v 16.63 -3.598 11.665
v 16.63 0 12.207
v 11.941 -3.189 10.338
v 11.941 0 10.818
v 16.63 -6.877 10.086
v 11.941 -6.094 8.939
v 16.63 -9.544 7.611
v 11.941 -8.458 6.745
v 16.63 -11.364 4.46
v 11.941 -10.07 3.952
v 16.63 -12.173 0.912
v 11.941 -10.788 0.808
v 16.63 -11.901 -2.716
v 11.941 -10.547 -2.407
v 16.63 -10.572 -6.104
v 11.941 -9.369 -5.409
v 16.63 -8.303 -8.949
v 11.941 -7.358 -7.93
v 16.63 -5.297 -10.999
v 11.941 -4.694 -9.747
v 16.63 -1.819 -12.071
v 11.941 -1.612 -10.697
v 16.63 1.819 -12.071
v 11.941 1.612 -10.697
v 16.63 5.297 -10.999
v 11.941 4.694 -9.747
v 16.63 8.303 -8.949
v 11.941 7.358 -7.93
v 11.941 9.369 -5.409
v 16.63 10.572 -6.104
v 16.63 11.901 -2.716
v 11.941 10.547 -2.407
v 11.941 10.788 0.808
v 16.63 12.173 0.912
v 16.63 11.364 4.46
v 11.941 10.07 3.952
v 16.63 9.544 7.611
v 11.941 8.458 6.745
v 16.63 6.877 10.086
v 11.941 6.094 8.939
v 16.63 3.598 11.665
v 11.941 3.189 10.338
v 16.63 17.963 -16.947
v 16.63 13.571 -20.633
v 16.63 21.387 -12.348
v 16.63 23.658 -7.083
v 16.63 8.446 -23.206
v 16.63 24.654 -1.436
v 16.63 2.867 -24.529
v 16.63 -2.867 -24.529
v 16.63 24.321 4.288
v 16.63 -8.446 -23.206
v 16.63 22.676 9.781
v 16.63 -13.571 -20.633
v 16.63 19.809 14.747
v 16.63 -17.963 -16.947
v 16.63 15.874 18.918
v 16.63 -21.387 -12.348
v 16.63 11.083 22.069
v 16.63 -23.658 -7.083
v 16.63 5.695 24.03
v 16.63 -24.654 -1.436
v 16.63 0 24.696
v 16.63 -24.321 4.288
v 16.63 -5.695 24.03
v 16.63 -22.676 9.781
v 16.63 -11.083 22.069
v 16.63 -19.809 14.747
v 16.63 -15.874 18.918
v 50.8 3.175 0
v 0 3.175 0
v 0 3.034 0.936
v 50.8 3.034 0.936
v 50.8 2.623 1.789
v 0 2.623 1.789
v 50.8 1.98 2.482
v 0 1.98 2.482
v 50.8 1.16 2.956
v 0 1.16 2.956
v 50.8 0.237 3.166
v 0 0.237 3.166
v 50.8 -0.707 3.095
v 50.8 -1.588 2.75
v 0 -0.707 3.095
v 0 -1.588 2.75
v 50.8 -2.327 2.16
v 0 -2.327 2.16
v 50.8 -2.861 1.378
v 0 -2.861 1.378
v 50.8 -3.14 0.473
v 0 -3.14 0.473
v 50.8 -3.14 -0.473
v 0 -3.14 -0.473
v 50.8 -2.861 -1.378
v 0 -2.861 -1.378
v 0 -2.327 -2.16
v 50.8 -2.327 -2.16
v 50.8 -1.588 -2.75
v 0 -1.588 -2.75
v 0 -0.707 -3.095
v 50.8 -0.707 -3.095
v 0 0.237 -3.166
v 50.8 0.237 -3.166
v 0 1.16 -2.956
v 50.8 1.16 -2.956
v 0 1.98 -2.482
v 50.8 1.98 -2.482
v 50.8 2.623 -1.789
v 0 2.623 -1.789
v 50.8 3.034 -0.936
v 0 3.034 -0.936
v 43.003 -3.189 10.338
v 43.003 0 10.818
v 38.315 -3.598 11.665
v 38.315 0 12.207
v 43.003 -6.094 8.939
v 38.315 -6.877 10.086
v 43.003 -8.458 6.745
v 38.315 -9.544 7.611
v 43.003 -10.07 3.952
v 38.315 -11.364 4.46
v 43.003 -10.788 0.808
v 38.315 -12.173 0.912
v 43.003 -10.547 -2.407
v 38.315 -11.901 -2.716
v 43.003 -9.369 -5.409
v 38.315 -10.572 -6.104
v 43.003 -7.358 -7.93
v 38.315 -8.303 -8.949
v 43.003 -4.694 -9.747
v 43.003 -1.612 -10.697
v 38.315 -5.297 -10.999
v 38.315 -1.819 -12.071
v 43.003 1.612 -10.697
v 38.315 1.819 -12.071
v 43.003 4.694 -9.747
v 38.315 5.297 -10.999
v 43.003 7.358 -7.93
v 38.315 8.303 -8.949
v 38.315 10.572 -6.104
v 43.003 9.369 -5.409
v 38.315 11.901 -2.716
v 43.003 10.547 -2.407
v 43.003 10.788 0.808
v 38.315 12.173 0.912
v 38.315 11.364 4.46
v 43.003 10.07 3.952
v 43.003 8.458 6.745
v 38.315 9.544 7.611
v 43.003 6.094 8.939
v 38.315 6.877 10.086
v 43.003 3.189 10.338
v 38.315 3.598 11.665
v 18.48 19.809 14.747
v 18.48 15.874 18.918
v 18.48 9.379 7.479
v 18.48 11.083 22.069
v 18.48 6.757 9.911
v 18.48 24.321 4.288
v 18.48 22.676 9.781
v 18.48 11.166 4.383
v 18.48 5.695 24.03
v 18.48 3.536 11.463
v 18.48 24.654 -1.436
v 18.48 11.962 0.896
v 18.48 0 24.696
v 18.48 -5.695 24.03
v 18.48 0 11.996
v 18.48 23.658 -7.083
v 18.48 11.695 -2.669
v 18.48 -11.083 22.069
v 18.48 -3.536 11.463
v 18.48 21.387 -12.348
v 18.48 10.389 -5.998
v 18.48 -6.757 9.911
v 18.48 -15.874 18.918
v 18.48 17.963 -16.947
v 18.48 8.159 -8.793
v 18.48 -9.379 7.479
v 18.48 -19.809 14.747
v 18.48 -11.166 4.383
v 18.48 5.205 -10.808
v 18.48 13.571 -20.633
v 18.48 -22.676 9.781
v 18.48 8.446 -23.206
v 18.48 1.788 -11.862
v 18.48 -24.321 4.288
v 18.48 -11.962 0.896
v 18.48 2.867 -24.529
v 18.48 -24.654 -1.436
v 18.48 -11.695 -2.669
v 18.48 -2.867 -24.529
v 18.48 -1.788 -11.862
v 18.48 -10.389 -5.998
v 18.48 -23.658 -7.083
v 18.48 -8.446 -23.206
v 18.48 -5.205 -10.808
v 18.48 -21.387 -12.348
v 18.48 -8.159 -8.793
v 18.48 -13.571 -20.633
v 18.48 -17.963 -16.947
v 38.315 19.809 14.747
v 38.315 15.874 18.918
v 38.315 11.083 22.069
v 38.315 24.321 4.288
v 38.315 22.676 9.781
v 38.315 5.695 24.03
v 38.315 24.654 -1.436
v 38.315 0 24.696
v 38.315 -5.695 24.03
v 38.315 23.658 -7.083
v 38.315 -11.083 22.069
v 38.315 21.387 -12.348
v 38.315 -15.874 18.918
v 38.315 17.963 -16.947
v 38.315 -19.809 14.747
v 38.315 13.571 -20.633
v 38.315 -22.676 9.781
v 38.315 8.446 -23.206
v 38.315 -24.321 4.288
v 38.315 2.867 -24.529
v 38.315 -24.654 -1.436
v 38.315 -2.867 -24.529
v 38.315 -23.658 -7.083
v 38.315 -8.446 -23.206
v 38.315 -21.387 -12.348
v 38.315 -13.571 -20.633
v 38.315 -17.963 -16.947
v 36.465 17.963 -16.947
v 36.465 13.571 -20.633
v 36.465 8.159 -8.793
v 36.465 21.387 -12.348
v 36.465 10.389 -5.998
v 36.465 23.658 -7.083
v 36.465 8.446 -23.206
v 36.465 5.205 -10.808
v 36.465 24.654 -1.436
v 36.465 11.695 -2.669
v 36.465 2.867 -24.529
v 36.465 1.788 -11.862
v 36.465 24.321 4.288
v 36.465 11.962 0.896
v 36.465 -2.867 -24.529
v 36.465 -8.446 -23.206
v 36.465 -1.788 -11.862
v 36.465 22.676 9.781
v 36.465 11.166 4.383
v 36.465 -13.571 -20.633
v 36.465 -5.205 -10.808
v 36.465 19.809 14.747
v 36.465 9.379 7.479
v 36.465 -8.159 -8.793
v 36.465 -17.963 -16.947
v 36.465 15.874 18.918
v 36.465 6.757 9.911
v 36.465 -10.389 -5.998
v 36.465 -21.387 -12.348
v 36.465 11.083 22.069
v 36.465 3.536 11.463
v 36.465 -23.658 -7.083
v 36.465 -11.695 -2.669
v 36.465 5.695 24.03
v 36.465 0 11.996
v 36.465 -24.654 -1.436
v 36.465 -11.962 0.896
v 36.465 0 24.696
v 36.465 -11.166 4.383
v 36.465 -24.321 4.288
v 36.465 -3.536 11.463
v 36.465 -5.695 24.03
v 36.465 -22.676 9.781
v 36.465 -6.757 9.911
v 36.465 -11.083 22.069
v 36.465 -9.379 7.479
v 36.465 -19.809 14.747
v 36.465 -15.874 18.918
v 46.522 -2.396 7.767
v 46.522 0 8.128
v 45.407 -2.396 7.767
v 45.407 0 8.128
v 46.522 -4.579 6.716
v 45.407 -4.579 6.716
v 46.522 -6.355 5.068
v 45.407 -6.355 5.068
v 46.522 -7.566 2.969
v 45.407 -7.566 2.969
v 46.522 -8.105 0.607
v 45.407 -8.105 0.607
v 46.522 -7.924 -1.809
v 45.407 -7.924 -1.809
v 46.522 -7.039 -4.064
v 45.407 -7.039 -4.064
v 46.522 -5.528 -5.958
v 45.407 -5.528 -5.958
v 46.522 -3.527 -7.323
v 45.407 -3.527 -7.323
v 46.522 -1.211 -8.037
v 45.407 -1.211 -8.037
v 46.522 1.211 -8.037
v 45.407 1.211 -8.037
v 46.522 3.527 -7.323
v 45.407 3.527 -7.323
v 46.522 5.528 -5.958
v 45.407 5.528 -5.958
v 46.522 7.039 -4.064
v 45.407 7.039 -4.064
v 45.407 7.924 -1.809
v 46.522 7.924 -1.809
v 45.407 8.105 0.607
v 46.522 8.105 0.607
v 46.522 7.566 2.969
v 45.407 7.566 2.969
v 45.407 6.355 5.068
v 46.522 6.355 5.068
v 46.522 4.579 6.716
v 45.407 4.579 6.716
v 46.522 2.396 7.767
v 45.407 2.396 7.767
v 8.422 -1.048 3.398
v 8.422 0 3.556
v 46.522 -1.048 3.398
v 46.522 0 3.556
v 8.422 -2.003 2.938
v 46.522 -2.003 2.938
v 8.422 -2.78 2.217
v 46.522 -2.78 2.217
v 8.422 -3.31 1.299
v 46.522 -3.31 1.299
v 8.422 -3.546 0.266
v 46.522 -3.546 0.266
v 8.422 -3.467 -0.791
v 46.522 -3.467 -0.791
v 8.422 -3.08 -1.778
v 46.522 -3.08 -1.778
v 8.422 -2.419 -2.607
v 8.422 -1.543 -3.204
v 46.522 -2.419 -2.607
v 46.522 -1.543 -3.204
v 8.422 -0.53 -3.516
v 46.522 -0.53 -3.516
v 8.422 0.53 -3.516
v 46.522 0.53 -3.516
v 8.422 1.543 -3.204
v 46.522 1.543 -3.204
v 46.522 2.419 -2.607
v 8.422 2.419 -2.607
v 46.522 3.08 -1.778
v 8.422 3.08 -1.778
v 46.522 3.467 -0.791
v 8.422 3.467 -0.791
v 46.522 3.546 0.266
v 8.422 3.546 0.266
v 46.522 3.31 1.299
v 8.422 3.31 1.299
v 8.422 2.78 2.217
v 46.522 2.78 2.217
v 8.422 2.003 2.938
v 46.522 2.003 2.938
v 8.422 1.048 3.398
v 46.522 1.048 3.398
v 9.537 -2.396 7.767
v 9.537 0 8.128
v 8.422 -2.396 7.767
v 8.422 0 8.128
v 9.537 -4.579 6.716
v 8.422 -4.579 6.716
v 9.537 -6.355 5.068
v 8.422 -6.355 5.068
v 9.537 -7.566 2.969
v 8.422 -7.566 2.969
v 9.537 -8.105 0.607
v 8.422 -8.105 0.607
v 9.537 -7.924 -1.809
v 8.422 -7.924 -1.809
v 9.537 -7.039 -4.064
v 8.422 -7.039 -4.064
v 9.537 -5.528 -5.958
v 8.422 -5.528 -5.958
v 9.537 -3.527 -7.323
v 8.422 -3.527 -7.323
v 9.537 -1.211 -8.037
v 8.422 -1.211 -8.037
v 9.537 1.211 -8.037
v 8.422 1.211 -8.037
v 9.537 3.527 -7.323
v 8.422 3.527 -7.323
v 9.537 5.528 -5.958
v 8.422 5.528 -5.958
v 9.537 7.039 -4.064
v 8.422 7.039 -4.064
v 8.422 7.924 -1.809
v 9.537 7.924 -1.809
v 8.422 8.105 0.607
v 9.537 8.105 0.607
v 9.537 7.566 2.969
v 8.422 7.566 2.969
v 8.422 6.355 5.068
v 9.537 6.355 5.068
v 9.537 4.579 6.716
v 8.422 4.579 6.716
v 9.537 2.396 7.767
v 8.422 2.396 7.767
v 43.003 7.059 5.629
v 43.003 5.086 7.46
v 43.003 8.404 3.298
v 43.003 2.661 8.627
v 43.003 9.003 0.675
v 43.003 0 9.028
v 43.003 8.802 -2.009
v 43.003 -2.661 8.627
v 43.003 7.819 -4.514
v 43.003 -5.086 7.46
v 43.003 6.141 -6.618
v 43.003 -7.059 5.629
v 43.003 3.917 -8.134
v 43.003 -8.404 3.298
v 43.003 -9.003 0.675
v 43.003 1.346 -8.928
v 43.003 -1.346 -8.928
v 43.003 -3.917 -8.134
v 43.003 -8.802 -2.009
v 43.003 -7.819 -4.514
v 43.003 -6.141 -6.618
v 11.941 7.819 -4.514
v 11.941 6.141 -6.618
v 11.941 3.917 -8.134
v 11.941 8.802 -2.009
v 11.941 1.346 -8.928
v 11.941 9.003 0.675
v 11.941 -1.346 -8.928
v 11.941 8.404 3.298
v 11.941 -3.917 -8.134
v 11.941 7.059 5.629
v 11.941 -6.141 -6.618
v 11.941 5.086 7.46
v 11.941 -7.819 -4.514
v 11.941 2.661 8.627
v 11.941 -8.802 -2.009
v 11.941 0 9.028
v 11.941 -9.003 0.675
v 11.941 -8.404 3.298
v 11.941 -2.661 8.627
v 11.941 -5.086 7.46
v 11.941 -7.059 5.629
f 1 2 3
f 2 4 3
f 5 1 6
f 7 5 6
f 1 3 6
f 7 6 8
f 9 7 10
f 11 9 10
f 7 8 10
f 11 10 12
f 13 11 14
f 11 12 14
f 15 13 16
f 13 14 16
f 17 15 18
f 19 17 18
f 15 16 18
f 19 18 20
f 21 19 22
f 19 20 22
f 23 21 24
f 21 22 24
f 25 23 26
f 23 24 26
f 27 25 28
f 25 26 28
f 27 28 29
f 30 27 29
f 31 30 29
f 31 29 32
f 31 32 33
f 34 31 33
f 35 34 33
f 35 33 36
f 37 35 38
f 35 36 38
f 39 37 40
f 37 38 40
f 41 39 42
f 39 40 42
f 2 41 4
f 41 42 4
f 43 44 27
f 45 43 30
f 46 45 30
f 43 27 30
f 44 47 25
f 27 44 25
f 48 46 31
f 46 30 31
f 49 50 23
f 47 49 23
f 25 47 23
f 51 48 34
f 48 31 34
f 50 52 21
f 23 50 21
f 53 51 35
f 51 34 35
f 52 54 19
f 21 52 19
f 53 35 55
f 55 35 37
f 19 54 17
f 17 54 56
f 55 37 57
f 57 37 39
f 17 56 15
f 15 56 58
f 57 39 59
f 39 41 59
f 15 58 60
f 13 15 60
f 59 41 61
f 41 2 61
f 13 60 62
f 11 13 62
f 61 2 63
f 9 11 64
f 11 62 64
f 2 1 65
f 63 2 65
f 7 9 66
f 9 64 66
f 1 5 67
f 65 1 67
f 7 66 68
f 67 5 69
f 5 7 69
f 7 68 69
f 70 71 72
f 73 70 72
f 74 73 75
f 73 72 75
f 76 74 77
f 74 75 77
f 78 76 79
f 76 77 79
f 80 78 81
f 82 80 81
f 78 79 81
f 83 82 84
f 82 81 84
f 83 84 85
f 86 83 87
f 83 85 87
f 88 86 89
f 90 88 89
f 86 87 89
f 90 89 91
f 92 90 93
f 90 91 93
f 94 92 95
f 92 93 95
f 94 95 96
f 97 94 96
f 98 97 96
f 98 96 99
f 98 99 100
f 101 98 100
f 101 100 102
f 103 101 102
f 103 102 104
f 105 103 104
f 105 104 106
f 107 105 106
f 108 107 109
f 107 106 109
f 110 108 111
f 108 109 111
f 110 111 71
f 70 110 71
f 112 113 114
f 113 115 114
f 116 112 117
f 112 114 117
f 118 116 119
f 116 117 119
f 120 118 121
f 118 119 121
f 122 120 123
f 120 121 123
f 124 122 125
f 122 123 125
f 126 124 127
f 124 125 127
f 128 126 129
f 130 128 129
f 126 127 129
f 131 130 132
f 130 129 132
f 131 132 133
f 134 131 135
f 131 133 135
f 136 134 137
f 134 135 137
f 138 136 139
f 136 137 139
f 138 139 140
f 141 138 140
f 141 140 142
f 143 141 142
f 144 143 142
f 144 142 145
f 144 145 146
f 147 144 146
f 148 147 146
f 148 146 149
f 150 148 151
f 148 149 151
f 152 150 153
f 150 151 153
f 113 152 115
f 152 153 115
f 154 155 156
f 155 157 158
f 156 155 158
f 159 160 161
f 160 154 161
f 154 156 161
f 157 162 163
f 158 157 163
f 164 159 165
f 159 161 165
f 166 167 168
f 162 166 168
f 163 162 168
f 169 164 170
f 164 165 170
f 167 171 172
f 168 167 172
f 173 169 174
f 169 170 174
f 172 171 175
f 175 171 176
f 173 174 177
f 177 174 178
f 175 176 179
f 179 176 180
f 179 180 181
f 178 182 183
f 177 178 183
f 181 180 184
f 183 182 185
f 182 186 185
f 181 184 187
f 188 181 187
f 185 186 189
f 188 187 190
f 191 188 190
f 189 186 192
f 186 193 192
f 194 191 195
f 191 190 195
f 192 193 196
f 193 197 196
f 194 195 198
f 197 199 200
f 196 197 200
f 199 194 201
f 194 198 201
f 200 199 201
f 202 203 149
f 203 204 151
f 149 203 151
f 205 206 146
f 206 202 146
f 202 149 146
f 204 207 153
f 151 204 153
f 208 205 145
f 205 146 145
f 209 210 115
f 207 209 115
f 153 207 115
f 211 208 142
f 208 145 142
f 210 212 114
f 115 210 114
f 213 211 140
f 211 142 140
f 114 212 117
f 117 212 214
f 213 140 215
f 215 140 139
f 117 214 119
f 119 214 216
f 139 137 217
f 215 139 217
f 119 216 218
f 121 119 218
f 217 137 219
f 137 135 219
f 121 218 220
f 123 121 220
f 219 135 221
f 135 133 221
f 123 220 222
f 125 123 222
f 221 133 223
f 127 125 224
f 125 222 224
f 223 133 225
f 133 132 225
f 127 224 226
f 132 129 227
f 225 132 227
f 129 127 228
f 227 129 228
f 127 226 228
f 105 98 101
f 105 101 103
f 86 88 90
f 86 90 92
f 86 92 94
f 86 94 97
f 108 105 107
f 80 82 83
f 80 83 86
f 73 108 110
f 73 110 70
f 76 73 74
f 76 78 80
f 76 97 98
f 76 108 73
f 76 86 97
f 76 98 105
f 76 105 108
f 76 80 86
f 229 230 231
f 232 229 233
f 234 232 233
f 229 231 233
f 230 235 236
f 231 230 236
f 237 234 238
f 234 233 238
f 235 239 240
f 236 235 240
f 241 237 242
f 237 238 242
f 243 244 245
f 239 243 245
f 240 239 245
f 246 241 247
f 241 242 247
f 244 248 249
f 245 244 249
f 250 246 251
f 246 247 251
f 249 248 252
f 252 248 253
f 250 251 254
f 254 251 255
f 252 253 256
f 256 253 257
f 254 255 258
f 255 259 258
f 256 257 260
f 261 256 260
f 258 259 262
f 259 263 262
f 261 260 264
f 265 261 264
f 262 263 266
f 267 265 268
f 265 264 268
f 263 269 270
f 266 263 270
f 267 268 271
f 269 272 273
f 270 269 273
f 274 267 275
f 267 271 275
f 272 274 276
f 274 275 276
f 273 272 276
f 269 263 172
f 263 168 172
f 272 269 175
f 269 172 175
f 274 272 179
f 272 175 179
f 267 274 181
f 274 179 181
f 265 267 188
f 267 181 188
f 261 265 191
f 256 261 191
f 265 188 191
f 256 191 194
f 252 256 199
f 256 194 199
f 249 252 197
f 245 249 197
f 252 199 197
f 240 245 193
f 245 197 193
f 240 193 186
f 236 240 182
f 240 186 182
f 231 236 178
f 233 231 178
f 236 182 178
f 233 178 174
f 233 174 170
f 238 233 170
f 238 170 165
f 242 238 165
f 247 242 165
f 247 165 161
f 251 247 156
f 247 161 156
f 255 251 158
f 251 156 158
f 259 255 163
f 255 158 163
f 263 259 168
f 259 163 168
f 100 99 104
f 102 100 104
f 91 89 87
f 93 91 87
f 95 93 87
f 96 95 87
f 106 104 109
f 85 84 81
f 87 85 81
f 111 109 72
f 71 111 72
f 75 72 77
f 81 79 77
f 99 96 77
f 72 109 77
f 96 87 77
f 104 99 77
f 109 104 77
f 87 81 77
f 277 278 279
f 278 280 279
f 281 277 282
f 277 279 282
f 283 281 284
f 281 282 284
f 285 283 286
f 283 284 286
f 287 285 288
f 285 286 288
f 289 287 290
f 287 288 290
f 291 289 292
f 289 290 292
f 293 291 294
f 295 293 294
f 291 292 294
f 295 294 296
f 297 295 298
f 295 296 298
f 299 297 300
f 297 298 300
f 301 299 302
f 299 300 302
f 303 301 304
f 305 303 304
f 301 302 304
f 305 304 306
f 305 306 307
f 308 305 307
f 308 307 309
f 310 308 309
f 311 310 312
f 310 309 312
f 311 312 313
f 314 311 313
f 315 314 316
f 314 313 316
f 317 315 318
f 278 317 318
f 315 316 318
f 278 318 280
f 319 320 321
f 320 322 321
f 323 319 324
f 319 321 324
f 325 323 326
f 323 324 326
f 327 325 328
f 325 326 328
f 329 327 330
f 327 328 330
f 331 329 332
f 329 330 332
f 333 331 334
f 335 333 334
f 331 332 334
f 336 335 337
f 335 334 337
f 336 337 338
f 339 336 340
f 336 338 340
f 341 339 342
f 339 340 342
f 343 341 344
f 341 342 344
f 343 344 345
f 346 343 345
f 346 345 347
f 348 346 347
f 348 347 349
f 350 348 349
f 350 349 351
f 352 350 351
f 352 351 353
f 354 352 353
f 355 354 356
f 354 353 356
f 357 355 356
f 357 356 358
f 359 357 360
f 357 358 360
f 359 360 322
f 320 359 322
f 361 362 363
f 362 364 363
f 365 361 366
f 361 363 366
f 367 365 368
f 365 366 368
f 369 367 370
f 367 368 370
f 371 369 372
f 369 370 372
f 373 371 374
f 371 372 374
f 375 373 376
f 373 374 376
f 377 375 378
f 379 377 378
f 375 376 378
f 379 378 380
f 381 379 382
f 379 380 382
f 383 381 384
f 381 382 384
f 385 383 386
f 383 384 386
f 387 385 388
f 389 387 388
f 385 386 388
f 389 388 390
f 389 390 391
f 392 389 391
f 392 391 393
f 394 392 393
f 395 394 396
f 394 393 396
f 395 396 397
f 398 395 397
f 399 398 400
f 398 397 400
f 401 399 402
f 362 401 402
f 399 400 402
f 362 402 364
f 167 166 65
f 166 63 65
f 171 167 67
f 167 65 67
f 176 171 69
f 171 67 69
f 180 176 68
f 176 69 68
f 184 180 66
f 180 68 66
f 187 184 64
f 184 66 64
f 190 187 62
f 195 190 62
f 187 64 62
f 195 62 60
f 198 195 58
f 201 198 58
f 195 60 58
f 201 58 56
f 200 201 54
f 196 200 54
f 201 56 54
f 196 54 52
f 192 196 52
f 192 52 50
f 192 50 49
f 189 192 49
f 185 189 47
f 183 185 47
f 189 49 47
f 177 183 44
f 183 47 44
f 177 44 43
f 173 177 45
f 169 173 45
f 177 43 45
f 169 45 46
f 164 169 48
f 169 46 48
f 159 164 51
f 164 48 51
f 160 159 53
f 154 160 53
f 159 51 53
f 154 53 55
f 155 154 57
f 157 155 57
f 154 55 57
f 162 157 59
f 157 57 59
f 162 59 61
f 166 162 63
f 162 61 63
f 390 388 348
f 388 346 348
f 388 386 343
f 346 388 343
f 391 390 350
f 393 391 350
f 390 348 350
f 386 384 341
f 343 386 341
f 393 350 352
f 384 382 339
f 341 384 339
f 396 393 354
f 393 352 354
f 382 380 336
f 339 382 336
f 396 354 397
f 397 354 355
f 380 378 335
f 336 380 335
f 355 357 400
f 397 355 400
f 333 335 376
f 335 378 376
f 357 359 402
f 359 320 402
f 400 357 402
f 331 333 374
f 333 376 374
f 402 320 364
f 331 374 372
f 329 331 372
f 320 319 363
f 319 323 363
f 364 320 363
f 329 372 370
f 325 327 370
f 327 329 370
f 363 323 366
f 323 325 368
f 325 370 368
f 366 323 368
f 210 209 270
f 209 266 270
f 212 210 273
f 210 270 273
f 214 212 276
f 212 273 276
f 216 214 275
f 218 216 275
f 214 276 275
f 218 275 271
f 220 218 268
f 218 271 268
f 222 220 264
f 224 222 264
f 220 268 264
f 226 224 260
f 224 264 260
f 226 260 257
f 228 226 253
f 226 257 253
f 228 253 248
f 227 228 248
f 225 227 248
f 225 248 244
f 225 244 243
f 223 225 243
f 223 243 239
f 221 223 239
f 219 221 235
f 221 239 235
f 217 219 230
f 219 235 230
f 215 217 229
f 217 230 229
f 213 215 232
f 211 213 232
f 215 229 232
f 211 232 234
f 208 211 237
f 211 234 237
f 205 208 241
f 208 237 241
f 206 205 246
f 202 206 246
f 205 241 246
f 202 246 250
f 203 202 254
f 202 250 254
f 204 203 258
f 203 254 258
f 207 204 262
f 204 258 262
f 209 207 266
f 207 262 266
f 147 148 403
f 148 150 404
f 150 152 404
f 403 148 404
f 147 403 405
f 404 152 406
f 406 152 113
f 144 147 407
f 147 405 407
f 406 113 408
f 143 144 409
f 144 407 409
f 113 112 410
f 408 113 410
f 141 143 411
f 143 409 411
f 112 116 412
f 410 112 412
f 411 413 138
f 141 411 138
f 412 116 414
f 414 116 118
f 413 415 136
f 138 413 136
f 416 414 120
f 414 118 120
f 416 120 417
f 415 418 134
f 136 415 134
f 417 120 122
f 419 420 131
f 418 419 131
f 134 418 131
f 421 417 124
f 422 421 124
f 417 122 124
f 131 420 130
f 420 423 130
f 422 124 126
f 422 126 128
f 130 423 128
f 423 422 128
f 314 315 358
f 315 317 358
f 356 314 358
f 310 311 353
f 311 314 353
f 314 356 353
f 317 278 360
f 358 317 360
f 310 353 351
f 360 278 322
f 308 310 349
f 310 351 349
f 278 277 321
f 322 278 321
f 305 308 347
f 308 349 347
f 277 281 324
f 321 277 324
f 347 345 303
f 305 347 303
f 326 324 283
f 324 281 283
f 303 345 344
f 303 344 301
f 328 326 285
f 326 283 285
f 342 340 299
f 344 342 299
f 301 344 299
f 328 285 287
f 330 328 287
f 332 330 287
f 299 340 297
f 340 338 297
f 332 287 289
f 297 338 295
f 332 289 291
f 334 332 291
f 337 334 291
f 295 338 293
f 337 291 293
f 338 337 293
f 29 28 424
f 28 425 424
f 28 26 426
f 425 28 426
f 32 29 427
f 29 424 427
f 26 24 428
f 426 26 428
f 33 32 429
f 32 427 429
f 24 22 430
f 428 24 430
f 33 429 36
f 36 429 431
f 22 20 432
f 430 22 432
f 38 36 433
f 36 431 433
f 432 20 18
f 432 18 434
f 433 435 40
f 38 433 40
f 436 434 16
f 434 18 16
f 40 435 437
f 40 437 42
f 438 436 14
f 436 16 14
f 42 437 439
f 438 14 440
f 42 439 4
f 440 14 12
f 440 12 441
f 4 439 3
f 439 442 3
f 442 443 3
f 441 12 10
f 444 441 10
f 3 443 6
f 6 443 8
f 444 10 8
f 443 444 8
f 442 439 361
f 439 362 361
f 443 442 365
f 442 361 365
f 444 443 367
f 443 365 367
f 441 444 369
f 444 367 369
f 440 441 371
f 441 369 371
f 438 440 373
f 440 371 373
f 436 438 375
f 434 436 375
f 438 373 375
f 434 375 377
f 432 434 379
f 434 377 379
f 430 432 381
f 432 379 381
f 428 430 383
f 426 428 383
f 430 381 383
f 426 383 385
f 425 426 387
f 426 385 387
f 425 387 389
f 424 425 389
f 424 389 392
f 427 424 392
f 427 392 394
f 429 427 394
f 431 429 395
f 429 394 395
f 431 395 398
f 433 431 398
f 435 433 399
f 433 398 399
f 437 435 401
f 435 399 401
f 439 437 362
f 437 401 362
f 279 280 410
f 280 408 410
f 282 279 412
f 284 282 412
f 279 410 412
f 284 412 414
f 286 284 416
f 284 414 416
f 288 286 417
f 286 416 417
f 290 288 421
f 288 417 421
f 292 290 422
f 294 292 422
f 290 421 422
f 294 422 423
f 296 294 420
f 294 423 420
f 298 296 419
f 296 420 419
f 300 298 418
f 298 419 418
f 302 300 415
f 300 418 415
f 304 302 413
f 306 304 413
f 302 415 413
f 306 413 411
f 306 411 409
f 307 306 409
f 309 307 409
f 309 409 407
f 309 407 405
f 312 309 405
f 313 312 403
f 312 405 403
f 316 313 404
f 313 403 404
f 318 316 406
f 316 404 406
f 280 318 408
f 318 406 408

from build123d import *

# Parameters (mm, degrees)
F0_R     = 3.175
F1_DEPTH = 50.8


with BuildPart() as f1:
    # F0 (on Right) → F1 (new body)
    with BuildSketch(Plane.YZ):
        Circle(F0_R)
    extrude(amount=F1_DEPTH)


with BuildPart() as f3:
    # F2 (on Front) → F3 (revolve)
    with BuildSketch(Plane.XZ):
        Polygon((8.422256, 8.128), (8.422256, 3.556), (46.522256, 3.556), (46.522256, 8.128), (45.407027, 8.128), (43.003283, 9.028385), (43.003283, 10.818309), (38.314555, 12.207471), (38.314555, 12.836852), (38.314555, 24.695684), (36.46487, 24.695684), (36.46487, 11.995684), (18.479642, 11.995684), (18.479642, 24.695684), (16.629957, 24.695684), (16.629957, 19.542553), (16.629957, 12.207471), (11.941229, 10.818309), (11.941229, 9.028385), (9.537485, 8.128), align=None)
    revolve(axis=Axis((27.472256, 0, 0), (1, 0, 0)))


solid = Compound([f1.part, f3.part])
